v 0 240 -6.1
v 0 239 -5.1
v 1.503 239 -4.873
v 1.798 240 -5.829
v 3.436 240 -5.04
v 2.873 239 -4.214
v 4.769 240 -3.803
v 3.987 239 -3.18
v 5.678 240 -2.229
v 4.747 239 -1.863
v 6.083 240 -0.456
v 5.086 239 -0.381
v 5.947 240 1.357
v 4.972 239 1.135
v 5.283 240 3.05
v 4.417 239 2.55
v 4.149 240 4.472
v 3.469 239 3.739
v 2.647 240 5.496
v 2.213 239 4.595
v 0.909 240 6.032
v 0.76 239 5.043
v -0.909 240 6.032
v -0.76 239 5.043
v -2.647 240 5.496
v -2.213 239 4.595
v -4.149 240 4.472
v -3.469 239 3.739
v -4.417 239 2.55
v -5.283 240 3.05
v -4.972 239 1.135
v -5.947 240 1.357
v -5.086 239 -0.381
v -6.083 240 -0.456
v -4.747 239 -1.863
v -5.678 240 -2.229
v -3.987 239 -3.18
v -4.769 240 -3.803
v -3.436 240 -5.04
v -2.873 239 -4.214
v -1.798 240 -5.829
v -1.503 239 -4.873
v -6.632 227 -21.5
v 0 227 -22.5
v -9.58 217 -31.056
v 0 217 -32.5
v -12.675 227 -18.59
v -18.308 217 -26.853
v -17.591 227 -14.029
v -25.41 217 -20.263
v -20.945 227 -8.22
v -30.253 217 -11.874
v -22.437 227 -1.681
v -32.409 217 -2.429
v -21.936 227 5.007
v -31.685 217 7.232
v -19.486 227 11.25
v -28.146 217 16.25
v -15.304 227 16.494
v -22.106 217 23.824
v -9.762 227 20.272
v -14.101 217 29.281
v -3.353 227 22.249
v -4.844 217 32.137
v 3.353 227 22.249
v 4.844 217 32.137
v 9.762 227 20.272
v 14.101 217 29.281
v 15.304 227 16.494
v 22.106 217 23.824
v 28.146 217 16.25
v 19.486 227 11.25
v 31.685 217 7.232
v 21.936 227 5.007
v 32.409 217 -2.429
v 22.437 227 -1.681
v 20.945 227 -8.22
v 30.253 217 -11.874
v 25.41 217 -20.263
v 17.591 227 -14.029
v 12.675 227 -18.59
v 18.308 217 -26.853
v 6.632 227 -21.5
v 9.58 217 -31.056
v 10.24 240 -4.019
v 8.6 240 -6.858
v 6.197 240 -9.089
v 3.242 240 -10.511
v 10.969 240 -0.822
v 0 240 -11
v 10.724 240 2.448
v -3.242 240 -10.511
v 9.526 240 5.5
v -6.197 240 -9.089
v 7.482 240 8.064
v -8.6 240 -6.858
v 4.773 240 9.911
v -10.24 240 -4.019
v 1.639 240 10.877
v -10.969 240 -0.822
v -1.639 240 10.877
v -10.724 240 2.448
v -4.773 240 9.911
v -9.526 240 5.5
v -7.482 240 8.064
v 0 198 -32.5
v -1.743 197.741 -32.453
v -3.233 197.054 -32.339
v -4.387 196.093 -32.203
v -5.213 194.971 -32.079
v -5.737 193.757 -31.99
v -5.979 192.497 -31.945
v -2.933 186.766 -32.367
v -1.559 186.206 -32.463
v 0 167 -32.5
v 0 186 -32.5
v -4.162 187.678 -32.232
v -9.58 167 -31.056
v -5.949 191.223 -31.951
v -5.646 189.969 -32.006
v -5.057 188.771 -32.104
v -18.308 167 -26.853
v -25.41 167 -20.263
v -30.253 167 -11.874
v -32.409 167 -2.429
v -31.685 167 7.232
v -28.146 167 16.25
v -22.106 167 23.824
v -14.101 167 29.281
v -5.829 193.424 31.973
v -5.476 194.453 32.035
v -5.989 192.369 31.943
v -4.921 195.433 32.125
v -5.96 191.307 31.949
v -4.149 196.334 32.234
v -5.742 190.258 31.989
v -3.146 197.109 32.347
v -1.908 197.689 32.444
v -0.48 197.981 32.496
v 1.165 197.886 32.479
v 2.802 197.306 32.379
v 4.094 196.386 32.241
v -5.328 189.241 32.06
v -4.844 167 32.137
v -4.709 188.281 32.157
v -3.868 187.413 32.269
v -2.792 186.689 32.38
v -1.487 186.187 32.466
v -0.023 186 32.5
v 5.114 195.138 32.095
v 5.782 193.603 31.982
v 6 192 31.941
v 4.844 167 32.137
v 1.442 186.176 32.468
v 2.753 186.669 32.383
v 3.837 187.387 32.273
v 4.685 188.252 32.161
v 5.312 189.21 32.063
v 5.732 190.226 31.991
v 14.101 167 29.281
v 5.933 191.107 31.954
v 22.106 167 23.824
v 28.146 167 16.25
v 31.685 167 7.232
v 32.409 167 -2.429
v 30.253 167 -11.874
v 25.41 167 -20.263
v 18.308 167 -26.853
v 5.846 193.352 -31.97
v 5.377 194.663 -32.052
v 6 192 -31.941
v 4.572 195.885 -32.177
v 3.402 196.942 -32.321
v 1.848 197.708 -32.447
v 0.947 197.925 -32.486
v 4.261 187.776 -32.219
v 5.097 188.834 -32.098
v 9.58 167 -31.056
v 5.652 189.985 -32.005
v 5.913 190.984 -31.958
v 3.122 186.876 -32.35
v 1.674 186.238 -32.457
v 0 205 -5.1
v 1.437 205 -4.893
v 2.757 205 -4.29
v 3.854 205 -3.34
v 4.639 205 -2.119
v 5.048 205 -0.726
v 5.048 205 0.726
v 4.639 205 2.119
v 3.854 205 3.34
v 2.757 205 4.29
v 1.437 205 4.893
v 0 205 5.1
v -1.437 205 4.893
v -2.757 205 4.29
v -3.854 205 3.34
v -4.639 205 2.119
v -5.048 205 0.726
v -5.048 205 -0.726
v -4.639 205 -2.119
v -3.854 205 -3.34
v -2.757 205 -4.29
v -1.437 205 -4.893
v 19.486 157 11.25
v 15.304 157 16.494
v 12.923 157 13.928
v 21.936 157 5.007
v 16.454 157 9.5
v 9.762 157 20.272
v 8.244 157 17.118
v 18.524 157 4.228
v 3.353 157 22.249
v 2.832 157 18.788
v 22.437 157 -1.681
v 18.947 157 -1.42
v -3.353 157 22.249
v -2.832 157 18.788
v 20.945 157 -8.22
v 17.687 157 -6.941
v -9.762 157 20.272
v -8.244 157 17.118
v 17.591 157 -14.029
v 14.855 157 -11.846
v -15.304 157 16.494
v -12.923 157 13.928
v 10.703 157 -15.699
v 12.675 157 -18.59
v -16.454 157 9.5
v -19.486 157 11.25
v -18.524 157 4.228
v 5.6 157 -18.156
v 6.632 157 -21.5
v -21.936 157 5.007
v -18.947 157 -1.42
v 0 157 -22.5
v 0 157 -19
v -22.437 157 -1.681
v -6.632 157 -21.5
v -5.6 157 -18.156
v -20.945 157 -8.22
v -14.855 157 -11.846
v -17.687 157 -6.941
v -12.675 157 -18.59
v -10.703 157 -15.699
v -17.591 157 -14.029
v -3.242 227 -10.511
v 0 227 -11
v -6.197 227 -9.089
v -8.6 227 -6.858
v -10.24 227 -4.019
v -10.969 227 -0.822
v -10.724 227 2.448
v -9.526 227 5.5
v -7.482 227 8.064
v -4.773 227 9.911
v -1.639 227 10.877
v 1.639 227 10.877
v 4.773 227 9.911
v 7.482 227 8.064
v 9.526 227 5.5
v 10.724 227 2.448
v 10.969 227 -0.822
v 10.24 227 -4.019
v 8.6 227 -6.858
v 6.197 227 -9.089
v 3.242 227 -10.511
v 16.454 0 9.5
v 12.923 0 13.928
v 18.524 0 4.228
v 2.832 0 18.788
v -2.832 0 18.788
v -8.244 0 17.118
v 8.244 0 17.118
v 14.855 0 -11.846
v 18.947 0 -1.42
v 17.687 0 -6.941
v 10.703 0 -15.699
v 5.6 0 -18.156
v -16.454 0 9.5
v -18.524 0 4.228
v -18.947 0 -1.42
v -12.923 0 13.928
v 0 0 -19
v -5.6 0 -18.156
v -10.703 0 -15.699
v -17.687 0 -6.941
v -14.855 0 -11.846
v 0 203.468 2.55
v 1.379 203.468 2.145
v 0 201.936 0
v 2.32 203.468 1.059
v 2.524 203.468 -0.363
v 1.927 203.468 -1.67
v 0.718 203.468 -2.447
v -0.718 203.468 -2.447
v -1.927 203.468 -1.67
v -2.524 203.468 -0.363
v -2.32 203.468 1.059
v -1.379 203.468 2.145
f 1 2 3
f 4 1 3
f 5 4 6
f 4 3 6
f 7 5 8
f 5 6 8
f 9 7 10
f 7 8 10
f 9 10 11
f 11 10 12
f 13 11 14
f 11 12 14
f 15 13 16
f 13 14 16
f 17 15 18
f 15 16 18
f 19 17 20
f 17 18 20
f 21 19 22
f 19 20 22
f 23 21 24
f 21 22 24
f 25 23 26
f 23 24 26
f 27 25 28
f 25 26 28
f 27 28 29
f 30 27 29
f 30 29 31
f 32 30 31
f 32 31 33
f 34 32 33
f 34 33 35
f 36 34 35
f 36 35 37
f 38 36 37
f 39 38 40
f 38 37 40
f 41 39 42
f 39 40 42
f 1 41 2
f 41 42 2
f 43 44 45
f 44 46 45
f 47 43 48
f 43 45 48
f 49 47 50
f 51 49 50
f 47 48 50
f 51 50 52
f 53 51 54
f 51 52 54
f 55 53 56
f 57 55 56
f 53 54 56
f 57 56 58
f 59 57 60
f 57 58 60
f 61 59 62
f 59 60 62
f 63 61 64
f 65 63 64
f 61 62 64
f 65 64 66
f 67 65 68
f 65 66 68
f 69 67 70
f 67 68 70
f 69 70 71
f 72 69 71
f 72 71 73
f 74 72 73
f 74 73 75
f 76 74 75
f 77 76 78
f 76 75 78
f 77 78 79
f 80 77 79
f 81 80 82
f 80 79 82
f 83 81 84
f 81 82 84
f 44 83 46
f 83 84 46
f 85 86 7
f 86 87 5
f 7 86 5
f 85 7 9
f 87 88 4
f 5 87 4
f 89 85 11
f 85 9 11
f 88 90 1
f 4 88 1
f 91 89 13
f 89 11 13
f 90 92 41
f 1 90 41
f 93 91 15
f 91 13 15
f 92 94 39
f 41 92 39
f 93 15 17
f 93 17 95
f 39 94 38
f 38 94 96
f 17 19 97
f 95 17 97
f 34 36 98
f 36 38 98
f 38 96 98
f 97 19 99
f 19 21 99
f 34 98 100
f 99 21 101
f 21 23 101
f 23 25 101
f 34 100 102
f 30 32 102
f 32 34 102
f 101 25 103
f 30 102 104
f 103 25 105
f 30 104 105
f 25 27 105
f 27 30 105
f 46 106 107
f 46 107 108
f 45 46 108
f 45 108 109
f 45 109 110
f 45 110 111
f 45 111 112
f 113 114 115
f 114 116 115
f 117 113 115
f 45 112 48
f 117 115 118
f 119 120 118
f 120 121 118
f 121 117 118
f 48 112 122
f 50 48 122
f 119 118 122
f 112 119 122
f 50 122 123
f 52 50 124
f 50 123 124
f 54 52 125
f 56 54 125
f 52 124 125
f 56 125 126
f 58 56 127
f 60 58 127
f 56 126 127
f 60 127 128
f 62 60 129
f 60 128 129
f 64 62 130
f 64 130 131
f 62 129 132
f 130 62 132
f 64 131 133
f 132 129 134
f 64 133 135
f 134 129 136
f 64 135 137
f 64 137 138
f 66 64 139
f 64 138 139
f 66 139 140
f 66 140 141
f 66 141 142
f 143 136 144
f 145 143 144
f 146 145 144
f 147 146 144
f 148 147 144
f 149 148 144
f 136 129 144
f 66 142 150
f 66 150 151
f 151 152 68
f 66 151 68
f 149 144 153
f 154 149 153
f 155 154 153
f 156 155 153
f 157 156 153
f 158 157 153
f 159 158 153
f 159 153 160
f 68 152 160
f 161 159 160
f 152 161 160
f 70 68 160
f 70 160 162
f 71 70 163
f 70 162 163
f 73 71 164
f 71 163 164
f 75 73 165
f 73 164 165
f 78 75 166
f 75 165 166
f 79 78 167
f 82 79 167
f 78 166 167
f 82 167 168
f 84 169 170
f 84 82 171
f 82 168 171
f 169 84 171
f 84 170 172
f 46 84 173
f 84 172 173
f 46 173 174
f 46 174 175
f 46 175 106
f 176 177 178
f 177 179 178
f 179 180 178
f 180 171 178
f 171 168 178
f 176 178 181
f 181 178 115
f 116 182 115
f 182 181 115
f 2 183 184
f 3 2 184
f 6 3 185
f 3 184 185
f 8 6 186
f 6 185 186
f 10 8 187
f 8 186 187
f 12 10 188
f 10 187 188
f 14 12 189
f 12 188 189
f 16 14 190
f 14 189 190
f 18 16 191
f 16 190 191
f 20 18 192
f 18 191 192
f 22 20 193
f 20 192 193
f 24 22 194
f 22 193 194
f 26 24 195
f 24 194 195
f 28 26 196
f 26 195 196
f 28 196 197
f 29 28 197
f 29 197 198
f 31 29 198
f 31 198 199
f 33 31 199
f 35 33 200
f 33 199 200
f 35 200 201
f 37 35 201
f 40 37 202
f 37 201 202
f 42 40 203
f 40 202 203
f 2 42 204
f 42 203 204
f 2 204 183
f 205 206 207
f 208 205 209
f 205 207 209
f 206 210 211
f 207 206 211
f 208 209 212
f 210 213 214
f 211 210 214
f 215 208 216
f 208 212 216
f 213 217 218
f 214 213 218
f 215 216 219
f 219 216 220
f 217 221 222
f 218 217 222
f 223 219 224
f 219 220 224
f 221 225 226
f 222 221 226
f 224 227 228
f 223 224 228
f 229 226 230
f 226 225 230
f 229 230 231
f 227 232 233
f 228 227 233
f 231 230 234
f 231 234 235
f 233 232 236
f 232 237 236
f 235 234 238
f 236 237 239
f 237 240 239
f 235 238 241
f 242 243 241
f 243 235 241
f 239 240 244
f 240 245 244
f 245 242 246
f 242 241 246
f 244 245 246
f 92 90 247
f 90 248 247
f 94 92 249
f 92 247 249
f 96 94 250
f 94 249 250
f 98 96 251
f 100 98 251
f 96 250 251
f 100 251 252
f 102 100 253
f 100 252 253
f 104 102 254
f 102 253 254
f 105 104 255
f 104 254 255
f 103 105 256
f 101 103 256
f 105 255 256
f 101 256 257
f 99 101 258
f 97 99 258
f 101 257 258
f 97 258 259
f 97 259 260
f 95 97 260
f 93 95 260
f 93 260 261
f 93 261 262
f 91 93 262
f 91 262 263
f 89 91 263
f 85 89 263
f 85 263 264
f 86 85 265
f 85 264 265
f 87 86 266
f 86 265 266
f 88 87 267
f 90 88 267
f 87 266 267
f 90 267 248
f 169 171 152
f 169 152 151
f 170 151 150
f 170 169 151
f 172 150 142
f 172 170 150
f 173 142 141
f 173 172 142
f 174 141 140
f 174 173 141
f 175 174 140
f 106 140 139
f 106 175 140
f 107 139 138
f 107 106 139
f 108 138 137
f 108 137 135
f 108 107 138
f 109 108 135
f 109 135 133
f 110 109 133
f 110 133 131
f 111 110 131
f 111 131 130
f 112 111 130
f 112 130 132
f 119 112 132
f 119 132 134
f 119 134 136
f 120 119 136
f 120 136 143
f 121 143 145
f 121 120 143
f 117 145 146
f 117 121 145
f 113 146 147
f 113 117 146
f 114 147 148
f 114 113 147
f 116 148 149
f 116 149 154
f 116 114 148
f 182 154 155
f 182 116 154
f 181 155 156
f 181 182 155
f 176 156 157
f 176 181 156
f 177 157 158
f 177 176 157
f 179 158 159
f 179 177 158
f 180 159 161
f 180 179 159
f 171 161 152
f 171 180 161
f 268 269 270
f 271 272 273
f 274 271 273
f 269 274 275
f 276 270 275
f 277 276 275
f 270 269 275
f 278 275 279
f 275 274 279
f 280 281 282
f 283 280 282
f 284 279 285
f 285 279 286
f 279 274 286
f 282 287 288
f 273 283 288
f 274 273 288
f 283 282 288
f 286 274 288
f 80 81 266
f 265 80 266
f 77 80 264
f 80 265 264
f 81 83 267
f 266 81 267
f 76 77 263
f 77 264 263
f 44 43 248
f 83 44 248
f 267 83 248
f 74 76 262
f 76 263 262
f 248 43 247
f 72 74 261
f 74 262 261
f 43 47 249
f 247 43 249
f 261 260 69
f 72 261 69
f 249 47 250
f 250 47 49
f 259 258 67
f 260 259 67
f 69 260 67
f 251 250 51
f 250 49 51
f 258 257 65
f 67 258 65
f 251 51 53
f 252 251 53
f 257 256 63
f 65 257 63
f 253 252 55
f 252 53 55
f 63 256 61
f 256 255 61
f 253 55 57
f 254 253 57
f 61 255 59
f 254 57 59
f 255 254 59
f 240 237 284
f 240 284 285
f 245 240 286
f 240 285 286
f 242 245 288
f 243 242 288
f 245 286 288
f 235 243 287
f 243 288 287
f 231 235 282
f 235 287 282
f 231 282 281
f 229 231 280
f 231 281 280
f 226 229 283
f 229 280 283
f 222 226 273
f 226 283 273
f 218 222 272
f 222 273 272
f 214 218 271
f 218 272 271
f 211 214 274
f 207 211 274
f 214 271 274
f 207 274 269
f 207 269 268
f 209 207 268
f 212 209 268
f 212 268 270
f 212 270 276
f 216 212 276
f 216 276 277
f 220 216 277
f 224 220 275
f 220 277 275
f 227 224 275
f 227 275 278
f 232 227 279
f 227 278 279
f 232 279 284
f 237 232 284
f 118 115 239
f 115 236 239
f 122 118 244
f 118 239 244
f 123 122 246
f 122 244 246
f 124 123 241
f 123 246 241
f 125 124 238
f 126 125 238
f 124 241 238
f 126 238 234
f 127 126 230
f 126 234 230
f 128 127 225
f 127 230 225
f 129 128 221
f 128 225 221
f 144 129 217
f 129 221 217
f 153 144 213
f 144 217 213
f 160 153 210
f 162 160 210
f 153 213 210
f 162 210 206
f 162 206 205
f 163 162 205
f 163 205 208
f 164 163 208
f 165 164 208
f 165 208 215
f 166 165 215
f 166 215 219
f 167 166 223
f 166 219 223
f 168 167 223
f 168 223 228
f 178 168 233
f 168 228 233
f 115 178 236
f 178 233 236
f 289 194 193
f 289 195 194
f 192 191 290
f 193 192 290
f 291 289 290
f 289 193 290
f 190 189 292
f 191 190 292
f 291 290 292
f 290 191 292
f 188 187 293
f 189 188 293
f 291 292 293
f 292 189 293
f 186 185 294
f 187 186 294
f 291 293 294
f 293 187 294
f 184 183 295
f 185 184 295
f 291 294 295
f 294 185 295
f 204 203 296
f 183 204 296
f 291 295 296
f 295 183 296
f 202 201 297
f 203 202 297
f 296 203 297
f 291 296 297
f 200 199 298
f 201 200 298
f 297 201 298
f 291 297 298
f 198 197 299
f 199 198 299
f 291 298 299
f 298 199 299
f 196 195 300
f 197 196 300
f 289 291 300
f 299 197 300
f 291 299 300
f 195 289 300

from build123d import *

# Parameters (mm, degrees)
M12_TAPPED_HOLE1_D      = 10.2
M12_TAPPED_HOLE1_DEPTH  = 35
M12_TAPPED_HOLE1_TIP    = 3.064389157
CUT_EXTRUDE1_DEPTH      = 245.361412666
CUT_EXTRUDE1_DEPTH_BACK = 245.361412666
SKETCH4_R               = 6
CHAMFER1_SIZE           = 1


with BuildPart() as part:
    # Sketch1 → Revolve1 (revolve)
    with BuildSketch(Plane.XY, mode=Mode.PRIVATE) as revolve1_sk:
        Polygon((0, 0), (0, 240), (11, 240), (11, 227), (22.5, 227), (32.5, 217), (32.5, 167), (22.5, 157), (19, 157), (19, 0), align=None)
    revolve(revolve1_sk.sketch.rotate(Axis((0, 0, 0), (0, 1, 0)), 90), axis=Axis((0, 0, 0), (0, 1, 0)))

    # M12 Tapped Hole1
    with Locations(Plane.ZX.offset(240)):
        with Locations((0, 0)):
            Hole(M12_TAPPED_HOLE1_D / 2, depth=M12_TAPPED_HOLE1_DEPTH)
            with Locations((0, 0, -(M12_TAPPED_HOLE1_DEPTH + M12_TAPPED_HOLE1_TIP / 2))):  # 118° drill point
                Cone(0, M12_TAPPED_HOLE1_D / 2, M12_TAPPED_HOLE1_TIP, mode=Mode.SUBTRACT)

    # Sketch4 → Cut-Extrude1 (cut, two sides: drawn at the far end of the back side and taken through both)
    with BuildSketch(Plane.XY.offset(-CUT_EXTRUDE1_DEPTH_BACK)):
        with Locations((0, 192)):
            Circle(SKETCH4_R)
    extrude(amount=CUT_EXTRUDE1_DEPTH + CUT_EXTRUDE1_DEPTH_BACK, mode=Mode.SUBTRACT)

    # Chamfer1
    chamfer1_edges = [part.edges().sort_by_distance(p)[0] for p in [
        (0, 240, 5.1),
    ]]
    chamfer(chamfer1_edges, length=CHAMFER1_SIZE)


solid = part.part
